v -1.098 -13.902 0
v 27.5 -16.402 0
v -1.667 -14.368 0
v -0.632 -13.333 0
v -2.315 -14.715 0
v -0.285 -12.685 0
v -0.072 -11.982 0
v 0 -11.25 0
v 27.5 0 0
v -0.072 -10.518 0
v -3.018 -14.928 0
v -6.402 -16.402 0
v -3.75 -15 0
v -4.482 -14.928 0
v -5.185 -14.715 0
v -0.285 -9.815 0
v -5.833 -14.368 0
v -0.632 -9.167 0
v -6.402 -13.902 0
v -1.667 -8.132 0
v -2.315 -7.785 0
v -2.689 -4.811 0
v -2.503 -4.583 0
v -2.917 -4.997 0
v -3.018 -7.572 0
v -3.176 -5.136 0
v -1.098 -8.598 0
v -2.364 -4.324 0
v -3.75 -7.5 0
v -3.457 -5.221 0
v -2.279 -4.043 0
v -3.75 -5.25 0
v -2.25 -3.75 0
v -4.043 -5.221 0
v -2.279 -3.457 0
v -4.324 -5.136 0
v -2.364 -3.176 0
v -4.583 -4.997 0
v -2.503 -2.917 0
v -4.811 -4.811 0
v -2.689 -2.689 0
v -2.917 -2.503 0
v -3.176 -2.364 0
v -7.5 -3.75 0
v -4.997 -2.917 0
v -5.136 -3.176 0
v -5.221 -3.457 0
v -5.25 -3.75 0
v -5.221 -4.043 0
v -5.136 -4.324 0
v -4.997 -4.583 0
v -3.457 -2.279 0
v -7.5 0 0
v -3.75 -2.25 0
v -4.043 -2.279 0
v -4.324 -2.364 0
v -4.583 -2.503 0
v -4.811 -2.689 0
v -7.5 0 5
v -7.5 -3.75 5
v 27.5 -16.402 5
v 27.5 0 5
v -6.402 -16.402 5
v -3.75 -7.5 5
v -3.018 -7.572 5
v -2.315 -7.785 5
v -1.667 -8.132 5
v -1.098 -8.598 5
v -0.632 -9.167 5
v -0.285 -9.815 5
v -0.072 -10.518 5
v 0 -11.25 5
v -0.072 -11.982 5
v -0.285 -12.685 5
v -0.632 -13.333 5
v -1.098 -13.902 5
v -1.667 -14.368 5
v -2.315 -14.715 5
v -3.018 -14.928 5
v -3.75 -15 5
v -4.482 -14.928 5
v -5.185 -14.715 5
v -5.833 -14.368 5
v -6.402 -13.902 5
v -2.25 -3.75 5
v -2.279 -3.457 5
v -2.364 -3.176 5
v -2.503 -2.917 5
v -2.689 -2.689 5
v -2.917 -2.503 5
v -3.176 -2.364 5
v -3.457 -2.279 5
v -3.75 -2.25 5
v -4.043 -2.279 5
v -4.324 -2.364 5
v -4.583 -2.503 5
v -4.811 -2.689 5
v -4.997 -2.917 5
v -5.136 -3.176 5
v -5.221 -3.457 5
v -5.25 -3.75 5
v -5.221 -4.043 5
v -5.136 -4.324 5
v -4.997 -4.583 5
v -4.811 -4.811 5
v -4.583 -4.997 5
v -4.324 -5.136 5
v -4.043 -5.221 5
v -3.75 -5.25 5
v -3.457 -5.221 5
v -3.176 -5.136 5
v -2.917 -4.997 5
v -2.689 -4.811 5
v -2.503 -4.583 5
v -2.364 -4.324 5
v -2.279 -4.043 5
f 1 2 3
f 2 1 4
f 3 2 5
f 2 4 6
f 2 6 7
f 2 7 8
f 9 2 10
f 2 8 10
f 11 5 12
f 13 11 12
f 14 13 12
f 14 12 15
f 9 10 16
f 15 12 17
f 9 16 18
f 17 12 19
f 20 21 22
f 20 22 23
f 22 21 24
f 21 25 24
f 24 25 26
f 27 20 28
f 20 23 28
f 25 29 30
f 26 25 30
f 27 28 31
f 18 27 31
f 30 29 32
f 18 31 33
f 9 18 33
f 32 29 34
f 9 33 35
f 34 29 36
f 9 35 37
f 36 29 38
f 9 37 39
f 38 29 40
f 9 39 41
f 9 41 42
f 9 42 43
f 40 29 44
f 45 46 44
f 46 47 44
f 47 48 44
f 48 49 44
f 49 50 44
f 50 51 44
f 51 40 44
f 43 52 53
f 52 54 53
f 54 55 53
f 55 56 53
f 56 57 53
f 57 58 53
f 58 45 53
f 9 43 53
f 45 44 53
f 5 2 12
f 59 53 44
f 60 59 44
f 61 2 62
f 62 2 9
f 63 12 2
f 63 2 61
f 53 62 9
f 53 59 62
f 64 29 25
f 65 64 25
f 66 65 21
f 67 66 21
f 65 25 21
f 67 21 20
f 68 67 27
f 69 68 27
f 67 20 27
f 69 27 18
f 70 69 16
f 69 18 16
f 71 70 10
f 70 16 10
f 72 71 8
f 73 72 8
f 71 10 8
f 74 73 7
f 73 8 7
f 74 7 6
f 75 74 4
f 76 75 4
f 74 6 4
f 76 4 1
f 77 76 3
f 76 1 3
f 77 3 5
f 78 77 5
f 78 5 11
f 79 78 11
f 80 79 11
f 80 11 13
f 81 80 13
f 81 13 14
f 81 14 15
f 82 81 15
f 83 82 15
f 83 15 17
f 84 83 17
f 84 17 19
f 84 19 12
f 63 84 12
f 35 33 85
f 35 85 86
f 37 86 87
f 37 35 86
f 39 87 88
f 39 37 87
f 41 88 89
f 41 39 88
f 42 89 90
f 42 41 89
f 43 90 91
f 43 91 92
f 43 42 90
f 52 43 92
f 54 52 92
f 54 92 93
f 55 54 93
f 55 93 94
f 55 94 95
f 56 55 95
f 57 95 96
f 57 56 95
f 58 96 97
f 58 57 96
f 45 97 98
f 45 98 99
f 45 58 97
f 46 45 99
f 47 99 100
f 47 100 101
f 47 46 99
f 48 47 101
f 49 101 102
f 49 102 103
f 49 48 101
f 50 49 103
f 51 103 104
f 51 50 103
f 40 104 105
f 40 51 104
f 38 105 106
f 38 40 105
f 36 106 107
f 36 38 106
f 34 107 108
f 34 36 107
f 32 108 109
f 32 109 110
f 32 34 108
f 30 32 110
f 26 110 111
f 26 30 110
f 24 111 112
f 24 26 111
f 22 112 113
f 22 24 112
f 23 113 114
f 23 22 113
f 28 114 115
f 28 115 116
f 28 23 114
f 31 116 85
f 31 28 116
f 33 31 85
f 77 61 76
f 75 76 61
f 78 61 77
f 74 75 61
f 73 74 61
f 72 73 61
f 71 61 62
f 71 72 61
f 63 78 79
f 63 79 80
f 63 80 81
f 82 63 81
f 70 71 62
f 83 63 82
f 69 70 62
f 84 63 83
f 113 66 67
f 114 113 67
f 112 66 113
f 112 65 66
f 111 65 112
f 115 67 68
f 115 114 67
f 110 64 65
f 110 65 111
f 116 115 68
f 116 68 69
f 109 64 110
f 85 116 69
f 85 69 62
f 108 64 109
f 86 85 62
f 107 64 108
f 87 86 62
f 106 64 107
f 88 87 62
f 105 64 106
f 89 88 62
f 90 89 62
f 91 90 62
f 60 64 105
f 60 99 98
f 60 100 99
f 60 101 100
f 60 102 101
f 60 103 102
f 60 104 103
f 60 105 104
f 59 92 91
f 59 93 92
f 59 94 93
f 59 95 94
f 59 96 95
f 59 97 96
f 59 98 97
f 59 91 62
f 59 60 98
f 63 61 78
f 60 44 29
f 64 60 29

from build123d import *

# Parameters (mm, degrees)
F0_R     = 1.5
F1_DEPTH = 5
F2_W     = 15
F2_H     = 15
F3_DEPTH = 25
F4_DEPTH = 20


with BuildPart() as f1:
    # F0 (on Top) → F1 (new body)
    with BuildSketch(Plane.XY):
        Polygon((7.5, -7.5), (7.5, 15), (-7.5, 15), (-7.5, 0), (-7.5, -3.75), (-3.75, -7.5), (0, -7.5), align=None)
        with Locations((-3.75, -3.75)):
            Circle(F0_R, mode=Mode.SUBTRACT)
        with BuildLine():
            Line((7.5, -16.4016504294), (7.5, -7.5))
            Line((7.5, -7.5), (0, -7.5))
            Line((0, -7.5), (-3.75, -7.5))
            ThreePointArc((-3.75, -7.5), (-0.2854517531, -12.6850628714), (-6.4016504294, -13.9016504294))
            Line((-6.4016504294, -13.9016504294), (-6.4016504294, -16.4016504294))
            Line((-6.4016504294, -16.4016504294), (0, -16.4016504294))
            Line((0, -16.4016504294), (7.5, -16.4016504294))
        make_face()
    extrude(amount=F1_DEPTH)

    # F2 (on face) → F3 (cut)
    with BuildSketch(Plane.XY.offset(5)):
        with Locations((0, 7.5)):
            Rectangle(F2_W, F2_H)
    extrude(amount=-F3_DEPTH, mode=Mode.SUBTRACT)

    # F4 (add): a face of the model
    f4_faces = [f1.faces().sort_by_distance(p)[0] for p in [
        (7.5, -8.2008252147, 2.5),
    ]]
    extrude(f4_faces, amount=F4_DEPTH)


solid = f1.part
